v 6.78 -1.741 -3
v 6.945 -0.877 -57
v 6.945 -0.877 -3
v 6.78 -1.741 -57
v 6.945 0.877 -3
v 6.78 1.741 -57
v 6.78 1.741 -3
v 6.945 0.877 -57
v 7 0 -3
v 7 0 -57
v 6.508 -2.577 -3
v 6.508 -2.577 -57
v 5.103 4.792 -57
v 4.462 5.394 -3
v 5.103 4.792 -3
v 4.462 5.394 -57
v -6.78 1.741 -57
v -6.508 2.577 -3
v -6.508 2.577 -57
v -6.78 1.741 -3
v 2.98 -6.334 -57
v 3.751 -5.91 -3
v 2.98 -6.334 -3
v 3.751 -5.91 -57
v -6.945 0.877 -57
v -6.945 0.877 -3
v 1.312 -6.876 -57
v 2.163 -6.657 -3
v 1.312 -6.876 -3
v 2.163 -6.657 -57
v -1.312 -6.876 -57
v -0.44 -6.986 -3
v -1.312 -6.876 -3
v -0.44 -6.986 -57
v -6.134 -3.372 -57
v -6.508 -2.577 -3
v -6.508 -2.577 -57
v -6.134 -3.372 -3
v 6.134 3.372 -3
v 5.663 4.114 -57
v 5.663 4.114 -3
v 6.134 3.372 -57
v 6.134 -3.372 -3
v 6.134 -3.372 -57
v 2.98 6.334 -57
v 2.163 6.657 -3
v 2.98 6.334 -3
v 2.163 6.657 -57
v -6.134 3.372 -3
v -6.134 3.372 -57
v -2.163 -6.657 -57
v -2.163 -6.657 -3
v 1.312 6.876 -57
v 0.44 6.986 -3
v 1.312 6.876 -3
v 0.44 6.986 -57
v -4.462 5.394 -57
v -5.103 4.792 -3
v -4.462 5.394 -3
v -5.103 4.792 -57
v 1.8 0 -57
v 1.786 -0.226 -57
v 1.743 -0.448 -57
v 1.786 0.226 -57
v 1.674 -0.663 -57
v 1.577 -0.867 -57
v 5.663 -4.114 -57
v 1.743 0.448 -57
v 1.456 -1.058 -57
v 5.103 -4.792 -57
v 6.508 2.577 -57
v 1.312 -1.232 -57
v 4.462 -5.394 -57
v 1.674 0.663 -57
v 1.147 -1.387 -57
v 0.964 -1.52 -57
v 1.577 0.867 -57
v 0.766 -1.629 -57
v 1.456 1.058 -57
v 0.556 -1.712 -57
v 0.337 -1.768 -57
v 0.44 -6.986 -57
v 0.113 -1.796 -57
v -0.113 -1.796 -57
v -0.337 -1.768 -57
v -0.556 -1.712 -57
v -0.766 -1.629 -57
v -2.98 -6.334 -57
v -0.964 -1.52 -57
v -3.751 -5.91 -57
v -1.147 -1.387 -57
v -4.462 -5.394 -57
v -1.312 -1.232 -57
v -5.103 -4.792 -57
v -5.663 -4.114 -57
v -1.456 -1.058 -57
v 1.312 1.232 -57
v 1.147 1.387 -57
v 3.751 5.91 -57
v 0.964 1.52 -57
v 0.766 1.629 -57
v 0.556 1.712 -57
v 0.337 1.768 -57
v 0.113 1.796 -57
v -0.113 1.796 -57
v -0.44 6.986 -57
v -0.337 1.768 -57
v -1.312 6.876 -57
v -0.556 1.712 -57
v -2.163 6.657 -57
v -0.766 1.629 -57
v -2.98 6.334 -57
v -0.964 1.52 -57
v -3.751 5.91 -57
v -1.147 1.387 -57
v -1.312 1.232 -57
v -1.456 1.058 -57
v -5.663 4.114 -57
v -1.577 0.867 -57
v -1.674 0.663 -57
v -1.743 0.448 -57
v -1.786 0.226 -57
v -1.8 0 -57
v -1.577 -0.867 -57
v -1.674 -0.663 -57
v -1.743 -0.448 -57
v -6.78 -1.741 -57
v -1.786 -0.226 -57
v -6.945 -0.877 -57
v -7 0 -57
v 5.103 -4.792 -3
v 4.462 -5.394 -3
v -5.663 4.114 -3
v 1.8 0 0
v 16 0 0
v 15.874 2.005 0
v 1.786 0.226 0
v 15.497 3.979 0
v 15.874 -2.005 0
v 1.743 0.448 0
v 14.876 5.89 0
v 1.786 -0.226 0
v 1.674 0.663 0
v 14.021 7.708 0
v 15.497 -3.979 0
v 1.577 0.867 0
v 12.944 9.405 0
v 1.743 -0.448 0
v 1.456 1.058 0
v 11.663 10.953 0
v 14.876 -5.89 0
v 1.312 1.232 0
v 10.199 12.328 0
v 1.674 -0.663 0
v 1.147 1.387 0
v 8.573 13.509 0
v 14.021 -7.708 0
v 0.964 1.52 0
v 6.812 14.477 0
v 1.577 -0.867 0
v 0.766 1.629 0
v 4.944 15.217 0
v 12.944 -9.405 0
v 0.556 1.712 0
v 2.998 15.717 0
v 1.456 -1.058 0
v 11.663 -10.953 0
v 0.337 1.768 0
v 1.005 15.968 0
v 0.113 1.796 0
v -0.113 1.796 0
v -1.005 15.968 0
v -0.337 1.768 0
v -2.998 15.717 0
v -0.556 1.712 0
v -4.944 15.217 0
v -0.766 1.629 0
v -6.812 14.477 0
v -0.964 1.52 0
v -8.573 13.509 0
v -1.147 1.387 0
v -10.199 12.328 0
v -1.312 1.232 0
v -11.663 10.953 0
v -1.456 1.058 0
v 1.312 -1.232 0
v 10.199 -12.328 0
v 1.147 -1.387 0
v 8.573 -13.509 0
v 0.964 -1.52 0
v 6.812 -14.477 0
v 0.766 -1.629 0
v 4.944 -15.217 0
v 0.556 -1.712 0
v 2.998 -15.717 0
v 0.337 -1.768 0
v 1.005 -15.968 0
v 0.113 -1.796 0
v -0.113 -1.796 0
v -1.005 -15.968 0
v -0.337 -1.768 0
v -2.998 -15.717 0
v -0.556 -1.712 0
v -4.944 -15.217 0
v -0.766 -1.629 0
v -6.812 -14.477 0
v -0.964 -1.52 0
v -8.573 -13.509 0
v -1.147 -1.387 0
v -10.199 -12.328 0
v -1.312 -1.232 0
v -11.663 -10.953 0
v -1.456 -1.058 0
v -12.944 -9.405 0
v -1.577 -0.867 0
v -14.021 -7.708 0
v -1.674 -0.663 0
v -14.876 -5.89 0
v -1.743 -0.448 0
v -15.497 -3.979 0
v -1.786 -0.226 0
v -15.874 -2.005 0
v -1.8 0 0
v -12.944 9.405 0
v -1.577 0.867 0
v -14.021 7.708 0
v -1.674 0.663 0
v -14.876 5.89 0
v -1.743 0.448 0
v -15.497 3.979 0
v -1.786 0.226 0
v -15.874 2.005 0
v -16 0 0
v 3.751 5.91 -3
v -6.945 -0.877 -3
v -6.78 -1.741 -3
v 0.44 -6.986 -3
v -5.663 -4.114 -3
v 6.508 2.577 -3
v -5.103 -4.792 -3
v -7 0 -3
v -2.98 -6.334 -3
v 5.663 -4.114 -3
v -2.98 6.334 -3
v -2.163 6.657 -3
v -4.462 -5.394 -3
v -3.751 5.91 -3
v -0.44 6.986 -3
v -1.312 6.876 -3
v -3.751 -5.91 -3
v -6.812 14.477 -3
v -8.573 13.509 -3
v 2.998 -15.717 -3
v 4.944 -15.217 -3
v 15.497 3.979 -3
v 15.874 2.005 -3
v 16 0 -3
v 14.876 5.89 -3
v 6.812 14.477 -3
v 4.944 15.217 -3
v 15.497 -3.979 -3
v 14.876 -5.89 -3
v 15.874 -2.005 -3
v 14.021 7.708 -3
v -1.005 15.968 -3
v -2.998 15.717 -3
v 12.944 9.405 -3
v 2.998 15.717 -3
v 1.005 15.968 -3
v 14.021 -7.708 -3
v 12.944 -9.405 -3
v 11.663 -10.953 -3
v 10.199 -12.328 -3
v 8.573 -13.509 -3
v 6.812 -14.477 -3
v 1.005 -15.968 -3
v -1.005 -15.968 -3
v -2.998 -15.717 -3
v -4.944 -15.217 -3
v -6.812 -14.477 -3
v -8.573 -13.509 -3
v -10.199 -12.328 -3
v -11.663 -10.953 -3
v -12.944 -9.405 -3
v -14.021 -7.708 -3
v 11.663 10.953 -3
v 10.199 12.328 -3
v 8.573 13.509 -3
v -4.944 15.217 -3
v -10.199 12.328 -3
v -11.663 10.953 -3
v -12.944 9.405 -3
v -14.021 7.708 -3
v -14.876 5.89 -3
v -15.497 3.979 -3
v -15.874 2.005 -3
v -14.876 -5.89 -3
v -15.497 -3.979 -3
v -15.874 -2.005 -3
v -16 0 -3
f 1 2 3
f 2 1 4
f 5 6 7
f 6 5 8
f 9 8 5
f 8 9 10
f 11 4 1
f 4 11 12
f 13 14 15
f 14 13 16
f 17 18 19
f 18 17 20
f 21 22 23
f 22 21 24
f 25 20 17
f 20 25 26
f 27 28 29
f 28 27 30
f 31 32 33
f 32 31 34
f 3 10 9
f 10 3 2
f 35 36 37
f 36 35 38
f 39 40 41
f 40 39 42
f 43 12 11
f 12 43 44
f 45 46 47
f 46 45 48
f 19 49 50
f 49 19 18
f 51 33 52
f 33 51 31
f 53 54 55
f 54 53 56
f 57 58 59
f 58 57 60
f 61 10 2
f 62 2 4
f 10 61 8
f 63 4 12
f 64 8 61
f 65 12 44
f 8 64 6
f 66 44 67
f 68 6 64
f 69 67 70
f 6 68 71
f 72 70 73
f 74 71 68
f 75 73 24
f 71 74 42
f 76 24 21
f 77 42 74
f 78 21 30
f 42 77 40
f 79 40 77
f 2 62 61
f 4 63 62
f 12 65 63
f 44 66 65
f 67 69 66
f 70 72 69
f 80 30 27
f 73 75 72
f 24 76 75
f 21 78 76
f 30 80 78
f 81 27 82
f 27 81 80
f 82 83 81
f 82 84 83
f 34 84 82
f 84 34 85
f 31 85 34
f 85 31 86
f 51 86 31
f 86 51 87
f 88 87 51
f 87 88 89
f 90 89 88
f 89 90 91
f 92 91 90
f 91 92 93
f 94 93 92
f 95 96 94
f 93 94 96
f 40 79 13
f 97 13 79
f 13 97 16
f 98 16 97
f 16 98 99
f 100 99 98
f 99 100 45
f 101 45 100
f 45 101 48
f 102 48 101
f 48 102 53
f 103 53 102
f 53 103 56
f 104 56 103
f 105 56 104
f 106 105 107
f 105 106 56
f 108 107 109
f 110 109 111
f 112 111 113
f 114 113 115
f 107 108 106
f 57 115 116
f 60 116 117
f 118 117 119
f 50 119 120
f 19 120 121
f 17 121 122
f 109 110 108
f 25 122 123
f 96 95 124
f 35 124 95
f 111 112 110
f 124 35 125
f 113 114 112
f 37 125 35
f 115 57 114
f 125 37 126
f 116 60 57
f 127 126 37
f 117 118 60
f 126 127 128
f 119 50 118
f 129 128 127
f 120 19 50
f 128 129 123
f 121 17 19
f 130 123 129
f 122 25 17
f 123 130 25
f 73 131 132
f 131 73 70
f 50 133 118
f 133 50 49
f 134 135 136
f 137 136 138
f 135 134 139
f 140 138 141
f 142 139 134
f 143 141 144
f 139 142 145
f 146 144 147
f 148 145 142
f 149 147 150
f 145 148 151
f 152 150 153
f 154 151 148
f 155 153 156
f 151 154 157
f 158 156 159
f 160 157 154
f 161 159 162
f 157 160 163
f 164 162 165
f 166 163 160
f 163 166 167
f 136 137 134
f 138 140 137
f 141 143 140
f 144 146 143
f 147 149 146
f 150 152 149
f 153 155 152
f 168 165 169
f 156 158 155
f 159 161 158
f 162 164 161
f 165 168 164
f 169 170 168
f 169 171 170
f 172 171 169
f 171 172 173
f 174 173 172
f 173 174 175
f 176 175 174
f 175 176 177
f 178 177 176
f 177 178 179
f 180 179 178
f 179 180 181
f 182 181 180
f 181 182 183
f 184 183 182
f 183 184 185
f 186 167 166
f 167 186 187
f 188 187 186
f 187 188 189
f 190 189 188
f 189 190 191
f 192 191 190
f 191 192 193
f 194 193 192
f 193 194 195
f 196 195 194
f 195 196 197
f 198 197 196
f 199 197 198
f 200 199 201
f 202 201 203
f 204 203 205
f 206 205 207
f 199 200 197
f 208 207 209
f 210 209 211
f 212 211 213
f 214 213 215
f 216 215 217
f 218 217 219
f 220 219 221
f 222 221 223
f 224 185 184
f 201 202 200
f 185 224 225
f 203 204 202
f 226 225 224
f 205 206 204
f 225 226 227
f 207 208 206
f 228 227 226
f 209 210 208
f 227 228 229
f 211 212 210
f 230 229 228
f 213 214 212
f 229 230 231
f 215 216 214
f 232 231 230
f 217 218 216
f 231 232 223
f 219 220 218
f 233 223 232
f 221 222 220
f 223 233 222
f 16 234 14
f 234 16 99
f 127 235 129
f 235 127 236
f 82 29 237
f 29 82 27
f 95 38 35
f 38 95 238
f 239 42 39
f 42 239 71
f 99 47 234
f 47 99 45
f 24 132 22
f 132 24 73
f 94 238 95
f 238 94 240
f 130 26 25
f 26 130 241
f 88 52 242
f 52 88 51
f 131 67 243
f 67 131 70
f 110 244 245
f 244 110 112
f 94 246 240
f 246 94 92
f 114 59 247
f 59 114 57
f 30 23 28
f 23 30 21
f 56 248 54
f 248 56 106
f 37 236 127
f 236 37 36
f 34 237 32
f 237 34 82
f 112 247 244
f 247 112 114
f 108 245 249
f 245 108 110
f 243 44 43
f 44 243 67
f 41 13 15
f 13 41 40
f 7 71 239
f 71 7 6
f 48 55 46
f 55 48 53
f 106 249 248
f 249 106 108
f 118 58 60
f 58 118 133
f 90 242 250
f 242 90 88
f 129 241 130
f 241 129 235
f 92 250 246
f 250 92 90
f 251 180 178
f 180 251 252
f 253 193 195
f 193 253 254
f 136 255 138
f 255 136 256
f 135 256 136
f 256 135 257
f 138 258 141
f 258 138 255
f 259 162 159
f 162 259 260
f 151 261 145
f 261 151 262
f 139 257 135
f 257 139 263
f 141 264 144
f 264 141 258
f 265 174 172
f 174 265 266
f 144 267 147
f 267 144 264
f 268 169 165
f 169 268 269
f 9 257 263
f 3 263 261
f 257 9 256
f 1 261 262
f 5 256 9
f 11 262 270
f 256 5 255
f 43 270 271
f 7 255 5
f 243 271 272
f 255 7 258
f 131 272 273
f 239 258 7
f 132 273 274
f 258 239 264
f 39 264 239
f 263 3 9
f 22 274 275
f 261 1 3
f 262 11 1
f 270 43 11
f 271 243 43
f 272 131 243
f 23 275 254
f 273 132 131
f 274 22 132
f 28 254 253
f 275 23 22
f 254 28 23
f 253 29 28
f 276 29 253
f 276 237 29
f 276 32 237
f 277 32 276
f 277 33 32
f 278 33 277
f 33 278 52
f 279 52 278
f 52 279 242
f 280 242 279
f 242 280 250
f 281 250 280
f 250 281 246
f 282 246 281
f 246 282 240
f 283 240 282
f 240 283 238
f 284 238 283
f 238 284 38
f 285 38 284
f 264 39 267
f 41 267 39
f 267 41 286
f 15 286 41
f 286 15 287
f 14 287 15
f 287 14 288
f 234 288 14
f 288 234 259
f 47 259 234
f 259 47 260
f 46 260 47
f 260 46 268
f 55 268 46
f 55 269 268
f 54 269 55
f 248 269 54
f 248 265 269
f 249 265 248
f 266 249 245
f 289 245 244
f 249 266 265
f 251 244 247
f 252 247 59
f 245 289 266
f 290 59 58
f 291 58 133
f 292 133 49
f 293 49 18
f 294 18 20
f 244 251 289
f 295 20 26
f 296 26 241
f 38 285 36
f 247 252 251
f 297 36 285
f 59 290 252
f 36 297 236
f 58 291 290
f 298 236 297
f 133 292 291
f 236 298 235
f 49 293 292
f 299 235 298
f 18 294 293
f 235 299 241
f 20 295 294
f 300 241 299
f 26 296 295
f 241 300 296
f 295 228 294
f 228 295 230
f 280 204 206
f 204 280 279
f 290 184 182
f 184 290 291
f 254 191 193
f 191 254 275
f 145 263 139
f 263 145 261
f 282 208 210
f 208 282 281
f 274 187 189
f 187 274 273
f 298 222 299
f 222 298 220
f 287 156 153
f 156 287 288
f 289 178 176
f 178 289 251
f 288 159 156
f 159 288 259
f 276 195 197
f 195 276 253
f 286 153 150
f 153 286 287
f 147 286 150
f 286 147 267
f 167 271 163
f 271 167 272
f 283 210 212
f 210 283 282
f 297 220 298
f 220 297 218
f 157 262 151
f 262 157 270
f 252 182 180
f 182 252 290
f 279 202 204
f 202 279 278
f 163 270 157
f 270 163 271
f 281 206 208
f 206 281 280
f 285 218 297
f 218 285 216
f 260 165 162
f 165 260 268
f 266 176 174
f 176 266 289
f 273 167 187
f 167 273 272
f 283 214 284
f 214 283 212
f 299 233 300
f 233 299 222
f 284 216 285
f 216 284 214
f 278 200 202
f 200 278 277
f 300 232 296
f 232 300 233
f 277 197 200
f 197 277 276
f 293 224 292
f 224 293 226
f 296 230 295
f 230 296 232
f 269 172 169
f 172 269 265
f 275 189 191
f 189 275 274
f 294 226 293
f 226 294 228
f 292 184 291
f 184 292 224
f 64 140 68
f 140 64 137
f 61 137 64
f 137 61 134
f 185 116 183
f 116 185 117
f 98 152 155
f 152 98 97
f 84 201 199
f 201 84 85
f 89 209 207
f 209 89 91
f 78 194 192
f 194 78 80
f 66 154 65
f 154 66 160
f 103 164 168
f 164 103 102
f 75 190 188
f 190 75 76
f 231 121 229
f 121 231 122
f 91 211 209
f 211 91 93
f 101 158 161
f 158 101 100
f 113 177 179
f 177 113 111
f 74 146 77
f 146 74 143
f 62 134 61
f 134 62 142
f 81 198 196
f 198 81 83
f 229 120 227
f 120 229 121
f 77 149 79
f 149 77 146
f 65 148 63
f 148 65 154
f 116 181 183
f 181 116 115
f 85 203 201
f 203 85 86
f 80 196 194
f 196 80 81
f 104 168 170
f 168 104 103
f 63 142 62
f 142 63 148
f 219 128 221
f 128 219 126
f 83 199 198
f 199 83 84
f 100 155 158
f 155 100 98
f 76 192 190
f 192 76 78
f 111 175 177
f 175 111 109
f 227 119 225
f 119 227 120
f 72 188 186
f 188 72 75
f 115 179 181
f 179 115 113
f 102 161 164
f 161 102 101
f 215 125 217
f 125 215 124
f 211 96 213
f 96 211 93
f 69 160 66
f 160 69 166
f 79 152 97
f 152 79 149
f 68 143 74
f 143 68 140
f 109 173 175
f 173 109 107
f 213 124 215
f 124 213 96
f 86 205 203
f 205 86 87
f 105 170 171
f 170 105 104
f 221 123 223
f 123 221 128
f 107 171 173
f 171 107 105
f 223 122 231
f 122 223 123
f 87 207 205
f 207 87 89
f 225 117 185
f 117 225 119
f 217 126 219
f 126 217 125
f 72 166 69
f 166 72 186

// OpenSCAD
$fn = 50;


difference() {
	union() {
		translate(v = [0, 0, -57.0000000000]) {
			cylinder(h = 57, r = 7.0000000000);
		}
		translate(v = [0, 0, -3.0000000000]) {
			cylinder(h = 3, r = 16.0000000000);
		}
	}
	union() {
		#translate(v = [0, 0, -57]) {
			cylinder(h = 57, r = 1.8000000000);
		}
	}
}
